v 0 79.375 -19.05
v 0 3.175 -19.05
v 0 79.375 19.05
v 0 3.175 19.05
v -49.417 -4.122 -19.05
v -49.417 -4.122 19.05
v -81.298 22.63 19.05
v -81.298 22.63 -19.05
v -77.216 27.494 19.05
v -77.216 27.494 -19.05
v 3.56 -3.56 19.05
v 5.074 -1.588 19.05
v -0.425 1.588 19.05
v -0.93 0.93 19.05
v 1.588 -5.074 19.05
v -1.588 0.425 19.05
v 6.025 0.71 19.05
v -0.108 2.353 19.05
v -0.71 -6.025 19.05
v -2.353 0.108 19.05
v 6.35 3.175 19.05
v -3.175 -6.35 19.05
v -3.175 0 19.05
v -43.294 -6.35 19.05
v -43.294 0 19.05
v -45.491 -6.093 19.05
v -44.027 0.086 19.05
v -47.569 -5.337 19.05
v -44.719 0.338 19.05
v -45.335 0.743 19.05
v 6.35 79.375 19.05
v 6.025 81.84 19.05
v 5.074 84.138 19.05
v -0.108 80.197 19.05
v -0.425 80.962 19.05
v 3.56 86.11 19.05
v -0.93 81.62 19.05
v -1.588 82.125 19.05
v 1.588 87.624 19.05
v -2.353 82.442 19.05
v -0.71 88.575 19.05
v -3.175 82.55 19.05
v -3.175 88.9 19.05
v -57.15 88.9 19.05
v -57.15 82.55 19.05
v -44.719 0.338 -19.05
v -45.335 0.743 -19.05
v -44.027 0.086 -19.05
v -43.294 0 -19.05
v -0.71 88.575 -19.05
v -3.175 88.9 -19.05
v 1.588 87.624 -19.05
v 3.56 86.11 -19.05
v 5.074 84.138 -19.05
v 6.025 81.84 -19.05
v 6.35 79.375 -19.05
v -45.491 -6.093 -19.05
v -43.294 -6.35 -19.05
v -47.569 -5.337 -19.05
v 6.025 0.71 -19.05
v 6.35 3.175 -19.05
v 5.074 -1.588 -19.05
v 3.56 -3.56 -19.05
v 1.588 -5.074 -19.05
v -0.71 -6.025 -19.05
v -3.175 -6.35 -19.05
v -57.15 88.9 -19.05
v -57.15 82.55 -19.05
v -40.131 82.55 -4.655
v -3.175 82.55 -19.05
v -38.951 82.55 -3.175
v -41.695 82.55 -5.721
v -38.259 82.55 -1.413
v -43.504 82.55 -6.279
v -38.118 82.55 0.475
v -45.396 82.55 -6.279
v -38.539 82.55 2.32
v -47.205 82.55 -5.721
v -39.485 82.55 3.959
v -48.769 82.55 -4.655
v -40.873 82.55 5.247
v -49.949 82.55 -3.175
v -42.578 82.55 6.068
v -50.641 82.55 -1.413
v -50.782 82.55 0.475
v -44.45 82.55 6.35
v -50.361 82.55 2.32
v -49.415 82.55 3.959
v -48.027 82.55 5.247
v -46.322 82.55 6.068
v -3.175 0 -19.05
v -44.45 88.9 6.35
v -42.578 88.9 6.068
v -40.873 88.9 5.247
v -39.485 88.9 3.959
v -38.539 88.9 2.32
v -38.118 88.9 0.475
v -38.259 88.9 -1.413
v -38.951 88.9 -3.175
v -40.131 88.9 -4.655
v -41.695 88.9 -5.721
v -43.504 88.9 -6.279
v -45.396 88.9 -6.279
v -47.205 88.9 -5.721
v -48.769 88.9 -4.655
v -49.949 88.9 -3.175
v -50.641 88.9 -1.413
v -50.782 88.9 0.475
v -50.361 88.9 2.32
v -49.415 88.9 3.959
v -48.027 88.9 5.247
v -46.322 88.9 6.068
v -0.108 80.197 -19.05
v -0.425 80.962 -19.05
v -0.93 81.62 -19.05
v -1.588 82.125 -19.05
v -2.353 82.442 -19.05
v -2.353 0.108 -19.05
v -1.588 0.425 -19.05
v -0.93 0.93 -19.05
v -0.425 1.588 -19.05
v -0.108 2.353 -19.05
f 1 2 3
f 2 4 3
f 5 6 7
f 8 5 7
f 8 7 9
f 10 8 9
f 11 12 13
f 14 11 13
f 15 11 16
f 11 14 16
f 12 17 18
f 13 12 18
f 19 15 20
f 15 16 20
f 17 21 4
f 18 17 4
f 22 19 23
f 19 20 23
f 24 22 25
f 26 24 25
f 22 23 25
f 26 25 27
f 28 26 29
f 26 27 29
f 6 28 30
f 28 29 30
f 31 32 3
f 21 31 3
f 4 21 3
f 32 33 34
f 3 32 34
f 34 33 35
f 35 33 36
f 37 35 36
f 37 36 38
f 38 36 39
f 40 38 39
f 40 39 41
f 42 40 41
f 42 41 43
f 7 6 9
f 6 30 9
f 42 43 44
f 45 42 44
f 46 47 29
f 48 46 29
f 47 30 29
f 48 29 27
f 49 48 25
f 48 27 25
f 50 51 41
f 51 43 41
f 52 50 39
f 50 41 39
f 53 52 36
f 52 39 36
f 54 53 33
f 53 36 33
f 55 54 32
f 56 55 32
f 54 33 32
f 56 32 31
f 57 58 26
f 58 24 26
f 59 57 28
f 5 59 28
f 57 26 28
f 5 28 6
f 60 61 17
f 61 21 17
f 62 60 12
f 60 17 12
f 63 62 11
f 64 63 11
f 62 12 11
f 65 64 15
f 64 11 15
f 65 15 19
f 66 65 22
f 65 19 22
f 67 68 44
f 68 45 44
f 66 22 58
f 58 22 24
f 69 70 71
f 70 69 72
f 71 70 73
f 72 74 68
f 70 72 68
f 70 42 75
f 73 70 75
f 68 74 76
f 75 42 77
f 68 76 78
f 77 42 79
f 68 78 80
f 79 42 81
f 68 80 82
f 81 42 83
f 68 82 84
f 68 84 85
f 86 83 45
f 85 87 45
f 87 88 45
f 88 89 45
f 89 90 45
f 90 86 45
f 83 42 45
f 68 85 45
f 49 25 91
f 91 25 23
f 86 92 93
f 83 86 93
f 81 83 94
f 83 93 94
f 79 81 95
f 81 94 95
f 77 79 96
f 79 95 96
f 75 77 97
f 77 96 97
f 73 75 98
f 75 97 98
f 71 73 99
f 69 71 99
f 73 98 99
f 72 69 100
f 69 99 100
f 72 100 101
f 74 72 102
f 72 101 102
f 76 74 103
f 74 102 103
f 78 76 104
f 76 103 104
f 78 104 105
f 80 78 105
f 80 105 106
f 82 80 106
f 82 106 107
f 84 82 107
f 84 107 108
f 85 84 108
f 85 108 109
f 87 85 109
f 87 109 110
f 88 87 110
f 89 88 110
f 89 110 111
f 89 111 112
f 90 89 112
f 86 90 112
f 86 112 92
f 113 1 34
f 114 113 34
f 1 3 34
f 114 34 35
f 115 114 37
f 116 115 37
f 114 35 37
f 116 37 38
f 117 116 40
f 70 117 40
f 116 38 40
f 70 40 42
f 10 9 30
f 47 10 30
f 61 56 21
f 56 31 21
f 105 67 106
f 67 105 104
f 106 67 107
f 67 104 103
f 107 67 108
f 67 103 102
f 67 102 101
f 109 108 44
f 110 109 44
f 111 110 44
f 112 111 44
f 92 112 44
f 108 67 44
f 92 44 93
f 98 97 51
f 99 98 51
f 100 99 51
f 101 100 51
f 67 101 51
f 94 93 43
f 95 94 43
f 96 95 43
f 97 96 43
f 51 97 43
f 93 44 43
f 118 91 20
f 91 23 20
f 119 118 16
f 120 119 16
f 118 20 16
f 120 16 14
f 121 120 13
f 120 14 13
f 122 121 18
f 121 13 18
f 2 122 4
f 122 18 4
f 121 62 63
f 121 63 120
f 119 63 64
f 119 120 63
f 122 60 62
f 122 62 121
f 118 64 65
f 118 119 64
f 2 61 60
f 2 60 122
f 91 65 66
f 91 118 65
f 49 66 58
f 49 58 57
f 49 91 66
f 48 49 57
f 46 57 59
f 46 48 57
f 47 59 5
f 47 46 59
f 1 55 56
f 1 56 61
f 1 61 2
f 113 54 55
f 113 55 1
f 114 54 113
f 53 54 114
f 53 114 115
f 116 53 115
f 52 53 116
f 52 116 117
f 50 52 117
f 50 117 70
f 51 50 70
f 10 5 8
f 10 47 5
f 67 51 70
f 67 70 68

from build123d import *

# Parameters (mm, degrees)
EXTRUDE_THIN1_DEPTH = 19.05
SKETCH2_R           = 6.35
CUT_EXTRUDE1_DEPTH  = 10


with BuildPart() as part:
    # Sketch1 → Extrude-Thin1 (new, symmetric)
    with BuildSketch(Plane.XY):
        with BuildLine():
            Line((-77.216, 27.494), (-45.335245866, 0.74281114))
            ThreePointArc((-45.335245866, 0.74281114), (-44.380308124, 0.191476527), (-43.294392527, 0))
            Line((-43.294392527, 0), (-3.175, 0))
            ThreePointArc((-3.175, 0), (-0.92993597, 0.92993597), (0, 3.175))
            Line((0, 3.175), (0, 79.375))
            ThreePointArc((0, 79.375), (-0.92993597, 81.62006403), (-3.175, 82.55))
            Line((-3.175, 82.55), (-57.15, 82.55))
            Line((-57.15, 82.55), (-57.15, 88.9))
            Line((-57.15, 88.9), (-3.175, 88.9))
            ThreePointArc((-3.175, 88.9), (3.560192091, 86.110192091), (6.35, 79.375))
            Line((6.35, 79.375), (6.35, 3.175))
            ThreePointArc((6.35, 3.175), (3.560192091, -3.560192091), (-3.175, -6.35))
            Line((-3.175, -6.35), (-43.294392527, -6.35))
            ThreePointArc((-43.294392527, -6.35), (-46.55213932, -5.775570419), (-49.416952544, -4.121566579))
            Line((-49.416952544, -4.121566579), (-81.297706678, 22.629622281))
            Line((-81.297706678, 22.629622281), (-77.216, 27.494))
        make_face()
    extrude(amount=EXTRUDE_THIN1_DEPTH, both=True)

    # Sketch2 → Cut-Extrude1 (cut)
    with BuildSketch(Plane(origin=(0, 88.9, 0), x_dir=(1, 0, 0), z_dir=(0, 1, 0))):
        with Locations(Location((-44.45, 0, 0), (0, 0, 270))):
            Circle(SKETCH2_R)
    extrude(amount=-CUT_EXTRUDE1_DEPTH, mode=Mode.SUBTRACT)


solid = part.part
